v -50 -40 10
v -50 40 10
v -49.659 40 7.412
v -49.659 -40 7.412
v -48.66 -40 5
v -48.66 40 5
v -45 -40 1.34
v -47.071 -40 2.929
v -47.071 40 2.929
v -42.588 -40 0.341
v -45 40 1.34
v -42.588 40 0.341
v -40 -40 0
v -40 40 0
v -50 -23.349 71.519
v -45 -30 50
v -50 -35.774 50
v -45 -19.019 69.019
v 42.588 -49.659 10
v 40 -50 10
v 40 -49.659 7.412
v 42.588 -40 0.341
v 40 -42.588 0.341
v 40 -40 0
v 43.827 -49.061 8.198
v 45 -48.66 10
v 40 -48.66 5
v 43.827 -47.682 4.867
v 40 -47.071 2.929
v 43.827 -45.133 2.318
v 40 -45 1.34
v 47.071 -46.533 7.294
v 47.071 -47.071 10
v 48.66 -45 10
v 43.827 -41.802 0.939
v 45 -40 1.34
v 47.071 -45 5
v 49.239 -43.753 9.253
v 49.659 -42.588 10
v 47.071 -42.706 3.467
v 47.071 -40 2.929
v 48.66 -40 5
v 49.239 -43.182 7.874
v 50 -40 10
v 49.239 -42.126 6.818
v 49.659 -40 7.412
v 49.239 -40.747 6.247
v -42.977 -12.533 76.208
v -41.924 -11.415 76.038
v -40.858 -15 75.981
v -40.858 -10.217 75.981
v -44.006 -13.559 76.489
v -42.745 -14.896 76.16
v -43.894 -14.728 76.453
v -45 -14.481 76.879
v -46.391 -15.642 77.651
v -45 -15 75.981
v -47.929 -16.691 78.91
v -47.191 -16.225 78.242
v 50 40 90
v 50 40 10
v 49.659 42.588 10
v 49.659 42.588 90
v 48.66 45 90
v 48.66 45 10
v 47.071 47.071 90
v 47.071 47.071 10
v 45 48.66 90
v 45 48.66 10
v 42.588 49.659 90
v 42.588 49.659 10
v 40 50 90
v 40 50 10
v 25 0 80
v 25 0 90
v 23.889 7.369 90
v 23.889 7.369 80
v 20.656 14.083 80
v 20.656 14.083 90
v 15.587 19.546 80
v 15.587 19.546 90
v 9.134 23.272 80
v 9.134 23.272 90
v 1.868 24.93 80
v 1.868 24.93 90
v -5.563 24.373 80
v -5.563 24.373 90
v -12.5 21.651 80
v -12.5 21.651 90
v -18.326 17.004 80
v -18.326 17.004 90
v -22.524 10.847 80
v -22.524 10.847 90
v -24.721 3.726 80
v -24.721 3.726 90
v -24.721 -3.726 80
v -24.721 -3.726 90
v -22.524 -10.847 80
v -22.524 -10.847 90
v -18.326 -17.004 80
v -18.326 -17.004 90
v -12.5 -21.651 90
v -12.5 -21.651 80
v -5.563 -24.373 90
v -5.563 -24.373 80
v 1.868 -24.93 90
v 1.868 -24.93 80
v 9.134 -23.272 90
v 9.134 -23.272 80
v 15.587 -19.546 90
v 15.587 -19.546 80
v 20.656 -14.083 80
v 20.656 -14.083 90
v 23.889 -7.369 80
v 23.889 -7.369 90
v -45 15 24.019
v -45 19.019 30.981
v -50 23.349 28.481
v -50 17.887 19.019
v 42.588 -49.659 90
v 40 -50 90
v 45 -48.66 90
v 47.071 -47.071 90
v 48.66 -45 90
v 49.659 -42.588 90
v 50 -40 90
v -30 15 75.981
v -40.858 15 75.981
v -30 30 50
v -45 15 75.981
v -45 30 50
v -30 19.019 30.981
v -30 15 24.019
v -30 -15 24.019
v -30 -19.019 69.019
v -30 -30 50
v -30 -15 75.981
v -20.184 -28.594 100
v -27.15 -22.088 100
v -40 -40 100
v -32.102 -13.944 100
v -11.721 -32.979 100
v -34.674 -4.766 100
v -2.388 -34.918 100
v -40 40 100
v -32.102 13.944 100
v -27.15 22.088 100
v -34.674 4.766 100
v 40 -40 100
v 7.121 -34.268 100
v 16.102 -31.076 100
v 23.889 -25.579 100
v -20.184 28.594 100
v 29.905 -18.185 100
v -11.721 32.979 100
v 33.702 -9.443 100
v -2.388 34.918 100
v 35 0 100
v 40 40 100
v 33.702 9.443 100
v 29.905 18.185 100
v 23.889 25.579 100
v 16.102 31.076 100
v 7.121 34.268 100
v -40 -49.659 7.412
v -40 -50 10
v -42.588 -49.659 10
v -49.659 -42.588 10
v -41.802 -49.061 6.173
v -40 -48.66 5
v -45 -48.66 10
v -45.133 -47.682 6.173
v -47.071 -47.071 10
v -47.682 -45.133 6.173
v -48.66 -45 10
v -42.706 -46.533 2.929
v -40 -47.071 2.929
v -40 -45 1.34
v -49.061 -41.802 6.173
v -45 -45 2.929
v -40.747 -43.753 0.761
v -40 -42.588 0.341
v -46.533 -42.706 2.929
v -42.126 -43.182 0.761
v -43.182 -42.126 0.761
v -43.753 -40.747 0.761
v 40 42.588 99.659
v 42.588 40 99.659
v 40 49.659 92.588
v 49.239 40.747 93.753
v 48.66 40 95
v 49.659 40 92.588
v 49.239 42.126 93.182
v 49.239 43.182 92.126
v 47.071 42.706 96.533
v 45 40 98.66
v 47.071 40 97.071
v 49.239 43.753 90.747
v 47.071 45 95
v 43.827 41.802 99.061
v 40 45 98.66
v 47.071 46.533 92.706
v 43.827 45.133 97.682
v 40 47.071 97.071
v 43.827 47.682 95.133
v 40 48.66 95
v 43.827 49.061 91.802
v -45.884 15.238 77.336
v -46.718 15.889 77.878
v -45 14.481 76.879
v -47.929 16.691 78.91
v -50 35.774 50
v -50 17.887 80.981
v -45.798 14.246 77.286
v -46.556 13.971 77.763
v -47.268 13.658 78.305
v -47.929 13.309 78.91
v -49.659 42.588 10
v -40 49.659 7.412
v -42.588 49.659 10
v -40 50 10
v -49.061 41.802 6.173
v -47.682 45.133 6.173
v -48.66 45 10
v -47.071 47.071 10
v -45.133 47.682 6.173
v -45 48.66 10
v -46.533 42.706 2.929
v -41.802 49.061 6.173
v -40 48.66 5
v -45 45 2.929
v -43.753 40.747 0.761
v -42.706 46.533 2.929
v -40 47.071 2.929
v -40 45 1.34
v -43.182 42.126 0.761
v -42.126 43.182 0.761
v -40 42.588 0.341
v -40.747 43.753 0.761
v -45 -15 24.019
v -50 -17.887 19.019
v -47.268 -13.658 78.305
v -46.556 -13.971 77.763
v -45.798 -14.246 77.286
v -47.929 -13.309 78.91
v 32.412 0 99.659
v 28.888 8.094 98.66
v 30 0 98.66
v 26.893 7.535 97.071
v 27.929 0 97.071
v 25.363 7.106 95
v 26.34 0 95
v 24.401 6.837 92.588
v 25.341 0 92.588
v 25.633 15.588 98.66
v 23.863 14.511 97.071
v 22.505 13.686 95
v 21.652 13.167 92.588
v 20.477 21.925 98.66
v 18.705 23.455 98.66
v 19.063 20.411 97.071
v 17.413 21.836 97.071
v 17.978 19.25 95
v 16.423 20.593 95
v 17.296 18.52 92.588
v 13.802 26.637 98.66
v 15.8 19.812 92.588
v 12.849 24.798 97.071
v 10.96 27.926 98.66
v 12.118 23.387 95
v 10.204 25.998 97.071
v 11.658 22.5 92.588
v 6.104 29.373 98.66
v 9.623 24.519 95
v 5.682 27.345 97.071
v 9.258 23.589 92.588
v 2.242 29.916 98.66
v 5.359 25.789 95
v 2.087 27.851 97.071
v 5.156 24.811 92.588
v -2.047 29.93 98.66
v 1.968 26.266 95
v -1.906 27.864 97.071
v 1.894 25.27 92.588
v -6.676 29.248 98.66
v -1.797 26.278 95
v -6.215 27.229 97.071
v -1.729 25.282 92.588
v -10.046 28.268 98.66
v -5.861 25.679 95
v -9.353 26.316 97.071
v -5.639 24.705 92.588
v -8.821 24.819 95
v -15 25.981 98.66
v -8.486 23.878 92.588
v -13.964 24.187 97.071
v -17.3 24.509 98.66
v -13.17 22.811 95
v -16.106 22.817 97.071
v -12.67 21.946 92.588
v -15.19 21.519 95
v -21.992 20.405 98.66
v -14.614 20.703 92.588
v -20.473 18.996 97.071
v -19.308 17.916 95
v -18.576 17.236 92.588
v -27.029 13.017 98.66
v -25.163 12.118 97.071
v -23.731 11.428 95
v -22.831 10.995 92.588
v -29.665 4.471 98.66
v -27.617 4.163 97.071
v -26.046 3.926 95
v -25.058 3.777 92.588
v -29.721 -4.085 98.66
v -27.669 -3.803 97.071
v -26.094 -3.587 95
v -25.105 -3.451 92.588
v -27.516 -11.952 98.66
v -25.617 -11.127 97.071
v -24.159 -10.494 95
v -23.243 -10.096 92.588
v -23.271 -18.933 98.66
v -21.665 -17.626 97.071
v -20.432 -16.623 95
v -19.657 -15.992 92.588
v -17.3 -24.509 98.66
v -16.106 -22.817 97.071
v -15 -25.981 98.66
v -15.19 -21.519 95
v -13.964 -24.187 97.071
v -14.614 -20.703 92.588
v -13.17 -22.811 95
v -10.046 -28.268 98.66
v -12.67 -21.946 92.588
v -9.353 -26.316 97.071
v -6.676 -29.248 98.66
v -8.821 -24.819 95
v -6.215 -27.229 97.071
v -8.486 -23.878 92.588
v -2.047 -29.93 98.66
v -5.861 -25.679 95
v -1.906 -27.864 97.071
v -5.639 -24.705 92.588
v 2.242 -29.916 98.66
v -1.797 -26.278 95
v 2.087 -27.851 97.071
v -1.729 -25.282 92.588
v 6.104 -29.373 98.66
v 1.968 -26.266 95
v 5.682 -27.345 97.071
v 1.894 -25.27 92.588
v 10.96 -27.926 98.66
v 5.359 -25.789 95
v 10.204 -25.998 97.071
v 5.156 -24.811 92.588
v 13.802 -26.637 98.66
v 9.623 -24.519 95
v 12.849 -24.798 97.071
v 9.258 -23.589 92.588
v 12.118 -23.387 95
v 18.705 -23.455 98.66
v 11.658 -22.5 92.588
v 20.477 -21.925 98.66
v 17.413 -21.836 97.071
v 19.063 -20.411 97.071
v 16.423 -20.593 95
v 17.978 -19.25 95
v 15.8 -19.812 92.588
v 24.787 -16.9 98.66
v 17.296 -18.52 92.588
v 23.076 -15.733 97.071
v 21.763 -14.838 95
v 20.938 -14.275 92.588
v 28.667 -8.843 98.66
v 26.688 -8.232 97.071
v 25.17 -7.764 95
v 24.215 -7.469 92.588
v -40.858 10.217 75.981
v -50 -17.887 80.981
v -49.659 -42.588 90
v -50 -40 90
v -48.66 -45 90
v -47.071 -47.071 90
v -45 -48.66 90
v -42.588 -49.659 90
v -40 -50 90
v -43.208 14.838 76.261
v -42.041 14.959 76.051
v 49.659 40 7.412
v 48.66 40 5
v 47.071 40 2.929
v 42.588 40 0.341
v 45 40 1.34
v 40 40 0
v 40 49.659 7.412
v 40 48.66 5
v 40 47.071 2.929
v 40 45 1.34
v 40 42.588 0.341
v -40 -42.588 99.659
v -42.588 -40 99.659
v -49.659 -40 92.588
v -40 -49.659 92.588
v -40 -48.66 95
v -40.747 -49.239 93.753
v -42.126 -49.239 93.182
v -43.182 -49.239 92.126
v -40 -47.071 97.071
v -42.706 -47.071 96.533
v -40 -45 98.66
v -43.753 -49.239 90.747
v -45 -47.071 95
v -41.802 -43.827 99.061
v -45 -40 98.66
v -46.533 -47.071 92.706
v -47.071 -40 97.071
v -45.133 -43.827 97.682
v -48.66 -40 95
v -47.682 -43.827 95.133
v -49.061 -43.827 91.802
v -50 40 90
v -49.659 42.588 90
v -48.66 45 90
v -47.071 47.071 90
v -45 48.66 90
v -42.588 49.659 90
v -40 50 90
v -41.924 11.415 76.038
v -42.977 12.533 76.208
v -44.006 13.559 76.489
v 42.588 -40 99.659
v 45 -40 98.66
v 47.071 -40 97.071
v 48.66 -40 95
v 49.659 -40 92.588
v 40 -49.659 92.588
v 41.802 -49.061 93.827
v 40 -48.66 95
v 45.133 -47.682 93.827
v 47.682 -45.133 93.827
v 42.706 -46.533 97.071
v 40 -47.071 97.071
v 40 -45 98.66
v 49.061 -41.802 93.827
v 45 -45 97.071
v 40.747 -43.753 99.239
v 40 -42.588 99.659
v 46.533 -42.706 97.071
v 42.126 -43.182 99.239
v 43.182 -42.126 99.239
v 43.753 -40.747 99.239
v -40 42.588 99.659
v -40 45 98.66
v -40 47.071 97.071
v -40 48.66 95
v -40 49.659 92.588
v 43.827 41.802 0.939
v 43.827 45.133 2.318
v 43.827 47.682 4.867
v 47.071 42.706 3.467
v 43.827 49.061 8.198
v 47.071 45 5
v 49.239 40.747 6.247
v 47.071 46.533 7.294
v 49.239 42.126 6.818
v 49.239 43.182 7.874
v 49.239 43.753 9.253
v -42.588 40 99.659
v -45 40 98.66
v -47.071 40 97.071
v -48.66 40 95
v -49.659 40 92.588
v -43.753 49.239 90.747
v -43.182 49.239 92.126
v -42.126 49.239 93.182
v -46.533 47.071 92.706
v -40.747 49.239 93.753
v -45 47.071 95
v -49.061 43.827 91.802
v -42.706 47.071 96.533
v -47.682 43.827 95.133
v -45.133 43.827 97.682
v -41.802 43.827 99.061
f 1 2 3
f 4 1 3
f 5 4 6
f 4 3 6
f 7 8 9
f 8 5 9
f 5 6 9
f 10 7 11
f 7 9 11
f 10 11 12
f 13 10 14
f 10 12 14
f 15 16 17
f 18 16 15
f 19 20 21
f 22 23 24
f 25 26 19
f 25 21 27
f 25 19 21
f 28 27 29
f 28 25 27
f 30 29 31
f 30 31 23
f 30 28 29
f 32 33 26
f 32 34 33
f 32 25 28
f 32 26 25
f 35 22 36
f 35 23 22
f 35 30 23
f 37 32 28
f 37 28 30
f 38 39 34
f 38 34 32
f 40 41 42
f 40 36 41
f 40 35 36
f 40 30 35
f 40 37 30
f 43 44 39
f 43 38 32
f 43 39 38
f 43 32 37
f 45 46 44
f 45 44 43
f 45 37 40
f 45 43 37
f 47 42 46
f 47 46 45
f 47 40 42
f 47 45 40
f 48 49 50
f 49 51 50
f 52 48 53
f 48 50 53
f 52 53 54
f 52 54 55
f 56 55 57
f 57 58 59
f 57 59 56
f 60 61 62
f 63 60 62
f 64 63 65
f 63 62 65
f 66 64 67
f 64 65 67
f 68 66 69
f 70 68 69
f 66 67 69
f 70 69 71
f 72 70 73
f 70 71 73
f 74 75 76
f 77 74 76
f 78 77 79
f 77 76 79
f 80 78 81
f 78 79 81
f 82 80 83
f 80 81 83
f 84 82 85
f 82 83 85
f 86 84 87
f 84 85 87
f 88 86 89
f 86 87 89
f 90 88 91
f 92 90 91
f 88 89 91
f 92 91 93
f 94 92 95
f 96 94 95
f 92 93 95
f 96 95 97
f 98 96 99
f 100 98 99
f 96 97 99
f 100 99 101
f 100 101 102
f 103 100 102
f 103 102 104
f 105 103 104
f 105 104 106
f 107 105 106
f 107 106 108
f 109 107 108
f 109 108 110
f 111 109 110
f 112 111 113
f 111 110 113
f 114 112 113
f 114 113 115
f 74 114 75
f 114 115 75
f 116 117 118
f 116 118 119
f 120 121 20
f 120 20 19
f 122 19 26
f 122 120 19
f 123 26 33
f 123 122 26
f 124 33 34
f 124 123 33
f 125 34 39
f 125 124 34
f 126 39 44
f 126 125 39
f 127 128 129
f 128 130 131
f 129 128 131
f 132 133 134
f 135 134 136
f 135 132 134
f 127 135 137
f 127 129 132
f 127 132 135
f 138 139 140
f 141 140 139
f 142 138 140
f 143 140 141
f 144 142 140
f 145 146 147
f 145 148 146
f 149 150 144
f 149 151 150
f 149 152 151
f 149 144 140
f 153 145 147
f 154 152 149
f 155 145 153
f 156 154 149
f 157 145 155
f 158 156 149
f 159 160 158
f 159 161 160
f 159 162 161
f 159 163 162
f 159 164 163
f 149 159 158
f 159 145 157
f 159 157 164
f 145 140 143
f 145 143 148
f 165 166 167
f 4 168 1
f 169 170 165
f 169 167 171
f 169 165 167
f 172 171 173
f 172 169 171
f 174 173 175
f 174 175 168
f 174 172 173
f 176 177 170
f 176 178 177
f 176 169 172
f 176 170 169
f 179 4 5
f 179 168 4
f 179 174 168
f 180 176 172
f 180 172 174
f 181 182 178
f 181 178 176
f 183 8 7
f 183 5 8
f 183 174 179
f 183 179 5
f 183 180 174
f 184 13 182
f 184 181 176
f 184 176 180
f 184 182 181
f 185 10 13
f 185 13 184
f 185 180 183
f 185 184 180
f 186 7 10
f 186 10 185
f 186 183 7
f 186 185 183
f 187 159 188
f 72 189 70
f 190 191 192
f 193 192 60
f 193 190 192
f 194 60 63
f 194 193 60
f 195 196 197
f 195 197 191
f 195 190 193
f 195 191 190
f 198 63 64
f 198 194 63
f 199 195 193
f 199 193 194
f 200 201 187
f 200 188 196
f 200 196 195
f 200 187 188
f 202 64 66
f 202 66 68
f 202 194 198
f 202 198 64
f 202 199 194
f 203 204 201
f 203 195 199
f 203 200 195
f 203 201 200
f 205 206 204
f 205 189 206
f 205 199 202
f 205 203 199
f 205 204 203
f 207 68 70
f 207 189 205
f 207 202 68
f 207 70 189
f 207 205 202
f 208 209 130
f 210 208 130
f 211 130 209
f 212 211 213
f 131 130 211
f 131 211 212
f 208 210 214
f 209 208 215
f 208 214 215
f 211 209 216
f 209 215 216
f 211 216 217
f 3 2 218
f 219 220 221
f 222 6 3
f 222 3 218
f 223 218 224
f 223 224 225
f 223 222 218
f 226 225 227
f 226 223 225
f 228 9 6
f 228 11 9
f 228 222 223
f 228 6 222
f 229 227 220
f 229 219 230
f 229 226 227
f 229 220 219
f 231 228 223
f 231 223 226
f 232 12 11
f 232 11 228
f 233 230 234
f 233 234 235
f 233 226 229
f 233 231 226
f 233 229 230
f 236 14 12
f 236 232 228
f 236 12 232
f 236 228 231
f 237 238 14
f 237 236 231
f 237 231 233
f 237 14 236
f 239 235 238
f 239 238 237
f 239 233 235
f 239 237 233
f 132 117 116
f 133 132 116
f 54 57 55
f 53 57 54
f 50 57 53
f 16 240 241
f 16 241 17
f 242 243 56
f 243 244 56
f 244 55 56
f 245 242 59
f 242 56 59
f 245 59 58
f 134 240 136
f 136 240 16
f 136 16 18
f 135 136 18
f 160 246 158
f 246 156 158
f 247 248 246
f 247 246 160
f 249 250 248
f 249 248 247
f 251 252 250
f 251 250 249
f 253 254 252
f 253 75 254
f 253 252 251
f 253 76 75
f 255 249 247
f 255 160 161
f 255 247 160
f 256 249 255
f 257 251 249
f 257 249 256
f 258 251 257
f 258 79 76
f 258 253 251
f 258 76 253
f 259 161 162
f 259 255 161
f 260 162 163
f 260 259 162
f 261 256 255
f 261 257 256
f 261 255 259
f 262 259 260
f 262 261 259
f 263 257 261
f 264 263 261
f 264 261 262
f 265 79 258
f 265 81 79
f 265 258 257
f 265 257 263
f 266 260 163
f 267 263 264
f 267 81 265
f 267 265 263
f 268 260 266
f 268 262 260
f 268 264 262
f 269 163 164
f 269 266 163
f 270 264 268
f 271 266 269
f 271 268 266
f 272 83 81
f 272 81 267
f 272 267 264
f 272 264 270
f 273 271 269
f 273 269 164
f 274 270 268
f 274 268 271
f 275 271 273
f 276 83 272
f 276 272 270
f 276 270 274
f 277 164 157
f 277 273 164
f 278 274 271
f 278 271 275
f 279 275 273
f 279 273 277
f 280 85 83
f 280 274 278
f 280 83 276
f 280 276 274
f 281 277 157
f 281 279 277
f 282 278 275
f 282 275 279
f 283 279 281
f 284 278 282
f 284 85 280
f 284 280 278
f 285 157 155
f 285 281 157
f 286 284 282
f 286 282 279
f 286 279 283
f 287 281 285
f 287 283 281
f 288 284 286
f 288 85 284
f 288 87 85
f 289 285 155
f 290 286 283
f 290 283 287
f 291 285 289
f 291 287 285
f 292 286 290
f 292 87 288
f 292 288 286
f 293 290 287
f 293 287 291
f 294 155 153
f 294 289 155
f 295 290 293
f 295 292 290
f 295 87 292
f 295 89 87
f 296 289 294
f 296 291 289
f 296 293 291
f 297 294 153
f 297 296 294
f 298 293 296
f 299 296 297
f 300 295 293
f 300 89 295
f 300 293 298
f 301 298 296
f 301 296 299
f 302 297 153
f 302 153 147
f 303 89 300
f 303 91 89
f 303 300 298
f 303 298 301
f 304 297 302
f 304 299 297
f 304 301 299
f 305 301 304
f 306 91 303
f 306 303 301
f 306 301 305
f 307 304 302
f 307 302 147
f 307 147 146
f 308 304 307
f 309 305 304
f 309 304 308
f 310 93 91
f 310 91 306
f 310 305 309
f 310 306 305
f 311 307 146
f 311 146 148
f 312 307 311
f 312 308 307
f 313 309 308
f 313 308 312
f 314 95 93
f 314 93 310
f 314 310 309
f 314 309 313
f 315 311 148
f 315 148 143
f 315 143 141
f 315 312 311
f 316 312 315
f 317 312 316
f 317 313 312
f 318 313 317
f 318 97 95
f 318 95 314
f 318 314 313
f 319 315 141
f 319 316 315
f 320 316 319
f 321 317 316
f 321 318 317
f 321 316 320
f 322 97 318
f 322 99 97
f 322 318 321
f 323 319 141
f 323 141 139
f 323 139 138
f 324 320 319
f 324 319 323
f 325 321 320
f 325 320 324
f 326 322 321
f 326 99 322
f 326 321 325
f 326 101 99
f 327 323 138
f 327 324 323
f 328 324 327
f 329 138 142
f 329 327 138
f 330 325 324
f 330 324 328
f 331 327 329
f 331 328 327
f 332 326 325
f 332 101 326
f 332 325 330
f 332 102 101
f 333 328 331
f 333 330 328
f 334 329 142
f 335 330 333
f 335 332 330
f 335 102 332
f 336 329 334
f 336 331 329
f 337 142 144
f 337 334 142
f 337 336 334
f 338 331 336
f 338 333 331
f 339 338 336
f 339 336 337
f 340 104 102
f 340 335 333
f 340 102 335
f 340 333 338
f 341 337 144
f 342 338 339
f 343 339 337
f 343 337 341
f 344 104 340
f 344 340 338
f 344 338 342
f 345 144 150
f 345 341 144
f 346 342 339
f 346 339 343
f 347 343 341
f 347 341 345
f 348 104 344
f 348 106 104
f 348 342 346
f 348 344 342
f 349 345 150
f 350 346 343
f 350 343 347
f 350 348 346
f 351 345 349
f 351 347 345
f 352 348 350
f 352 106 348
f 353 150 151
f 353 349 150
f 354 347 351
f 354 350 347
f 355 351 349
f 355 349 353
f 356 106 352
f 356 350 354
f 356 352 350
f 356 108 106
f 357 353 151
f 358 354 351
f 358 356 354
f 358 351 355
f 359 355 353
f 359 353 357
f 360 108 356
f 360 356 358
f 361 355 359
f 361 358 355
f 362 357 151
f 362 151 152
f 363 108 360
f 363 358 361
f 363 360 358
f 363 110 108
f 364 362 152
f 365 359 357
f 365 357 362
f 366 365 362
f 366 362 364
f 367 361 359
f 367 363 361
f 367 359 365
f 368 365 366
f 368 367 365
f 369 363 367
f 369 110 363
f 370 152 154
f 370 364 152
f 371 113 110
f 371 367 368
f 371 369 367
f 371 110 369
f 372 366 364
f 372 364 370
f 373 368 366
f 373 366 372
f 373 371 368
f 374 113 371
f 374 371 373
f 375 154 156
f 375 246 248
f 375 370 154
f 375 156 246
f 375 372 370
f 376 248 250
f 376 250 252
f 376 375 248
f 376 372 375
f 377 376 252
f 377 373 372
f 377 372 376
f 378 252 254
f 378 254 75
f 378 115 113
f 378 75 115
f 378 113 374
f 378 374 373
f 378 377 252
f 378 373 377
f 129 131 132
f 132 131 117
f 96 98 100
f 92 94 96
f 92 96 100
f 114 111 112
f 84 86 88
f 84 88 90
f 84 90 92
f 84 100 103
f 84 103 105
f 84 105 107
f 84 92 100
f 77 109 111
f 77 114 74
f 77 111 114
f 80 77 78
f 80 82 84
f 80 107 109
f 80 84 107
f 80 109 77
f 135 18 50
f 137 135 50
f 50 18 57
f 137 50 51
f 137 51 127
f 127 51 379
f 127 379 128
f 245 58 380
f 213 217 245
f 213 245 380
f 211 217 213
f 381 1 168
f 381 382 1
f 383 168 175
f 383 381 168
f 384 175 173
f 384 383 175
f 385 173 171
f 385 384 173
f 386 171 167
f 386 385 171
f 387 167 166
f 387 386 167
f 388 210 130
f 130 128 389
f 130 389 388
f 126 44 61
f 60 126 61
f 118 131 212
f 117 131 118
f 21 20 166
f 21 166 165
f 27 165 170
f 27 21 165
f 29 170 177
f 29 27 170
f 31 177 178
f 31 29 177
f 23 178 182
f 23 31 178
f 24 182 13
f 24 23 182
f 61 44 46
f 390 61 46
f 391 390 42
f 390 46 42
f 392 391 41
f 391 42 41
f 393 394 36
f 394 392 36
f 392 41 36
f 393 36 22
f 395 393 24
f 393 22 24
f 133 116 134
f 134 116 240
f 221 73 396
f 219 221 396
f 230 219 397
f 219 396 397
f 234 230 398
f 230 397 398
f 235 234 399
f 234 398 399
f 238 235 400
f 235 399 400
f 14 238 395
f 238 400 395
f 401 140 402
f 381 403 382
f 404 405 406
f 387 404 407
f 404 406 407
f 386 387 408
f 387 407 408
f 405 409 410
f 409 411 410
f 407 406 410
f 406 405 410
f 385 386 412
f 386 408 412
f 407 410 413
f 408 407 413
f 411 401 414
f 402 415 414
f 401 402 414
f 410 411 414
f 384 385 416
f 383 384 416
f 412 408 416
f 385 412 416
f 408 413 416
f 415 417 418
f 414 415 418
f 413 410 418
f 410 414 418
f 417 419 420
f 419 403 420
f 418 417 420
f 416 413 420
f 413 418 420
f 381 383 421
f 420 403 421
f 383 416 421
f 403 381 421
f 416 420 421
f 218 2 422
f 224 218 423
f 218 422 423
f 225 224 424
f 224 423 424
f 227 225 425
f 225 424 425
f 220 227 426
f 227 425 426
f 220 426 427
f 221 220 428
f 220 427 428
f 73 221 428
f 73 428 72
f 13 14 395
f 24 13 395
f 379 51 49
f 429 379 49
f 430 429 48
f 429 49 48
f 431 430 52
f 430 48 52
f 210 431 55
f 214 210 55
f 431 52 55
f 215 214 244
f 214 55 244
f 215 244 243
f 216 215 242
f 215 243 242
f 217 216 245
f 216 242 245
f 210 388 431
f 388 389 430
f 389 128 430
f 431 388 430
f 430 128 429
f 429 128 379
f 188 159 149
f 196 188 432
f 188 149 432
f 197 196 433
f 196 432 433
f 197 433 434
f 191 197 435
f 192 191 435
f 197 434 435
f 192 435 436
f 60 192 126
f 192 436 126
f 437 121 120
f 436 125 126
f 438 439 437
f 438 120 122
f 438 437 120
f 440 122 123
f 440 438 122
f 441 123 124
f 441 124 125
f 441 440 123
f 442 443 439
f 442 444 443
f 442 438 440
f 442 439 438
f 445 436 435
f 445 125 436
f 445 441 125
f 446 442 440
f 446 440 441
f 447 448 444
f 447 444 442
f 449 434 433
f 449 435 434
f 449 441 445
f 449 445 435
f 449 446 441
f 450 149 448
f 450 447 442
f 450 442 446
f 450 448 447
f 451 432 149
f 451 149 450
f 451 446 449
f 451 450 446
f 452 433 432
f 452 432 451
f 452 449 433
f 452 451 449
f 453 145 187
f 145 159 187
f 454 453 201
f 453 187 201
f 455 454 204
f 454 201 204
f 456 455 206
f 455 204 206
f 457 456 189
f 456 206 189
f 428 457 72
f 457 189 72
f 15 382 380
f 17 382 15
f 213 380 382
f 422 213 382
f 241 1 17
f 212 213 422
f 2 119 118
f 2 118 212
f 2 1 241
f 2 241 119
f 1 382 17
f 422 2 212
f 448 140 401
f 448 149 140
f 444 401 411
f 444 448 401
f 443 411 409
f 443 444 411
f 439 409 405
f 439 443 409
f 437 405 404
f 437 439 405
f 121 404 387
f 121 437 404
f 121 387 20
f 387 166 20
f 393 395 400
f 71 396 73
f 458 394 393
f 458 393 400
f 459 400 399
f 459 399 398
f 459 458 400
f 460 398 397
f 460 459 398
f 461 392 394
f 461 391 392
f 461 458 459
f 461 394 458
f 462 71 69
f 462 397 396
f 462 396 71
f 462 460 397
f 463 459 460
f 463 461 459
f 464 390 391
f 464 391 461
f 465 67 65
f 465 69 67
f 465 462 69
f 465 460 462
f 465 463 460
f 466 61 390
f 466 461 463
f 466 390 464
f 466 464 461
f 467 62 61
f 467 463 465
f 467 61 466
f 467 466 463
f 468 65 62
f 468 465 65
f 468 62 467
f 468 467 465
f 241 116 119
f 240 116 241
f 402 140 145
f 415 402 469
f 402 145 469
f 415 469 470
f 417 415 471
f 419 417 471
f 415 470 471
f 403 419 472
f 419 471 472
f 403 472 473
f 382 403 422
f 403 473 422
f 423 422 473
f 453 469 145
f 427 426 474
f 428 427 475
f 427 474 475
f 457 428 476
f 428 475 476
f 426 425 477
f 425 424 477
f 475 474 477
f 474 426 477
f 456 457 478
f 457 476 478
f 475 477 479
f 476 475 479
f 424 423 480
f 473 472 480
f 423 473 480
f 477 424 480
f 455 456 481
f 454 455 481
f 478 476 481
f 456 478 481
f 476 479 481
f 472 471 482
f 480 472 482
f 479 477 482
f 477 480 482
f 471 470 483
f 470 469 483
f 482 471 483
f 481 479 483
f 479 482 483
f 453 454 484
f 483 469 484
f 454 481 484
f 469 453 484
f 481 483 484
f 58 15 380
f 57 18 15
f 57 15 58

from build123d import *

# Parameters (mm, degrees)
SKETCH1_W           = 100
SKETCH1_H           = 100
BOSS_EXTRUDE1_DEPTH = 100
SKETCH2_R           = 25
CUT_EXTRUDE1_DEPTH  = 20
CUT_EXTRUDE3_DEPTH  = 20
CHAMFER1_SIZE       = 5
FILLET1_R           = 10
FILLET2_R           = 10
FILLET3_R           = 10


with BuildPart() as part:
    # Sketch1 → Boss-Extrude1 (new body)
    with BuildSketch(Plane.XY):
        Rectangle(SKETCH1_W, SKETCH1_H)
    extrude(amount=BOSS_EXTRUDE1_DEPTH)

    # Sketch2 → Cut-Extrude1 (cut)
    with BuildSketch(Plane.XY.offset(100)):
        Circle(SKETCH2_R)
    extrude(amount=-CUT_EXTRUDE1_DEPTH, mode=Mode.SUBTRACT)

    # Sketch6 → Cut-Extrude3 (cut)
    with BuildSketch(Plane.ZY.offset(50)):
        Polygon((69.019237886, -19.019237886), (30.980762114, 19.019237886), (24.019237886, 15), (24.019237886, -15), (50, -30), align=None)
        Polygon((50, 30), (30.980762114, 19.019237886), (69.019237886, -19.019237886), (75.980762114, -15), (75.980762114, 15), align=None)
    extrude(amount=-CUT_EXTRUDE3_DEPTH, mode=Mode.SUBTRACT)

    # Chamfer1
    chamfer1_edges = [part.edges().sort_by_distance(p)[0] for p in [
        (-50, -22.5, 37.009618943),
        (-50, -22.5, 62.990381057),
        (-50, 0, 75.980762114),
        (-50, 22.5, 62.990381057),
        (-50, 22.5, 37.009618943),
        (-50, 0, 24.019237886),
    ]]
    chamfer(chamfer1_edges, length=CHAMFER1_SIZE)

    # Fillet1
    fillet1_edges = [part.edges().sort_by_distance(p)[0] for p in [
        (-25, 0, 100),
    ]]
    fillet(fillet1_edges, radius=FILLET1_R)

    # Fillet2
    fillet2_edges = [part.edges().sort_by_distance(p)[0] for p in [
        (-50, 0, 100),
        (0, -50, 100),
        (0, -50, 0),
        (50, -50, 50),
        (-50, -50, 50),
        (-50, 50, 50),
        (0, 50, 100),
    ]]
    fillet(fillet2_edges, radius=FILLET2_R)

    # Fillet3
    # the kernel refuses this fillet: 10 mm, written as the material it takes off along each edge
    with BuildSketch(Plane(origin=(40, -40, 10), x_dir=(0, 0, -1), z_dir=(1, 0, 0))) as fillet3_piece_1_section:
        Polygon((0, 0), (FILLET3_R, 0), (FILLET3_R, -FILLET3_R), (0, -FILLET3_R), align=None)
    fillet3_piece_1 = extrude(amount=FILLET3_R, mode=Mode.PRIVATE)
    fillet3_piece_1 = fillet3_piece_1 - Plane(origin=(40, -40, 10), x_dir=(0, 0.7071067811865475, 0.7071067811865475), z_dir=(1, 0, 0)) * Sphere(FILLET3_R, mode=Mode.PRIVATE)
    add(fillet3_piece_1, mode=Mode.SUBTRACT)
    with BuildSketch(Plane(origin=(40, -40, 90), x_dir=(1, 0, 0), z_dir=(0, 0, 1))) as fillet3_piece_2_section:
        Polygon((0, 0), (FILLET3_R, 0), (FILLET3_R, -FILLET3_R), (0, -FILLET3_R), align=None)
    fillet3_piece_2 = extrude(amount=FILLET3_R, mode=Mode.PRIVATE)
    fillet3_piece_2 = fillet3_piece_2 - Plane(origin=(40, -40, 90), x_dir=(-0.7071067811865475, 0.7071067811865475, 0), z_dir=(0, 0, 1)) * Sphere(FILLET3_R, mode=Mode.PRIVATE)
    add(fillet3_piece_2, mode=Mode.SUBTRACT)
    with BuildSketch(Plane(origin=(-40, -40, 10), x_dir=(-1, 0, 0), z_dir=(0, 0, -1))) as fillet3_piece_3_section:
        Polygon((0, 0), (FILLET3_R, 0), (FILLET3_R, -FILLET3_R), (0, -FILLET3_R), align=None)
    fillet3_piece_3 = extrude(amount=FILLET3_R, mode=Mode.PRIVATE)
    fillet3_piece_3 = fillet3_piece_3 - Plane(origin=(-40, -40, 10), x_dir=(0.7071067811865475, 0.7071067811865475, 0), z_dir=(0, 0, -1)) * Sphere(FILLET3_R, mode=Mode.PRIVATE)
    add(fillet3_piece_3, mode=Mode.SUBTRACT)
    with BuildSketch(Plane(origin=(40, 40, 10), x_dir=(0, 1, 0), z_dir=(1, 0, 0))) as fillet3_piece_4_section:
        Polygon((0, 0), (FILLET3_R, 0), (FILLET3_R, -FILLET3_R), (0, -FILLET3_R), align=None)
    fillet3_piece_4 = extrude(amount=FILLET3_R, mode=Mode.PRIVATE)
    fillet3_piece_4 = fillet3_piece_4 - Plane(origin=(40, 40, 10), x_dir=(0, -0.7071067811865475, 0.7071067811865475), z_dir=(1, 0, 0)) * Sphere(FILLET3_R, mode=Mode.PRIVATE)
    add(fillet3_piece_4, mode=Mode.SUBTRACT)
    with BuildSketch(Plane(origin=(-45, -25.355339059, 75.980762114), x_dir=(-0.7071067811865476, 0, 0.7071067811865476), z_dir=(0, 1, 0))) as fillet3_piece_5_section:
        with BuildLine():
            CenterArc((FILLET3_R * 0.414213562373, FILLET3_R), FILLET3_R, 225, 45)
            Line((-FILLET3_R * 0.292893218813, FILLET3_R * 0.292893218813), (0, 0))
            Line((0, 0), (FILLET3_R * 0.414213562373, 0))
        make_face()
    fillet3_piece_5 = extrude(amount=50.710678119, mode=Mode.PRIVATE)
    fillet3_piece_5 = split(fillet3_piece_5, bisect_by=Plane(origin=(-43.280595019, -13.170460791, 75.710807016), z_dir=(0.7071067811865477, -0.6123724356957944, 0.35355339059327423)), keep=Keep.TOP, mode=Mode.PRIVATE)
    fillet3_piece_5 = split(fillet3_piece_5, bisect_by=Plane(origin=(-42.707460026, -14.659509184, 76.570509507), z_dir=(0, 0.8660254037844383, -0.5000000000000008)), keep=Keep.TOP, mode=Mode.PRIVATE)
    add(fillet3_piece_5, mode=Mode.SUBTRACT)
    with BuildSketch(Plane(origin=(-45, -25.355339059, 75.980762114), x_dir=(-0.7071067811865476, 0, 0.7071067811865476), z_dir=(0, 1, 0))) as fillet3_piece_6_section:
        with BuildLine():
            CenterArc((FILLET3_R * 0.414213562373, FILLET3_R), FILLET3_R, 225, 45)
            Line((-FILLET3_R * 0.292893218813, FILLET3_R * 0.292893218813), (0, 0))
            Line((0, 0), (FILLET3_R * 0.414213562373, 0))
        make_face()
    fillet3_piece_6 = extrude(amount=50.710678119, mode=Mode.PRIVATE)
    fillet3_piece_6 = split(fillet3_piece_6, bisect_by=Plane(origin=(-46.28634247, -15.385729384, 77.885344161), z_dir=(-0.7071067811865477, 0.6123724356957944, -0.35355339059327423)), keep=Keep.TOP, mode=Mode.PRIVATE)
    fillet3_piece_6 = split(fillet3_piece_6, bisect_by=Plane(origin=(-46.715123293, -14.271724128, 77.242172926), z_dir=(0, -0.8660254037844383, 0.5000000000000008)), keep=Keep.TOP, mode=Mode.PRIVATE)
    add(fillet3_piece_6, mode=Mode.SUBTRACT)
    with BuildSketch(Plane(origin=(-45, -25.355339059, 75.980762114), x_dir=(-0.7071067811865476, 0, 0.7071067811865476), z_dir=(0, 1, 0))) as fillet3_piece_7_section:
        with BuildLine():
            CenterArc((FILLET3_R * 0.414213562373, FILLET3_R), FILLET3_R, 225, 45)
            Line((-FILLET3_R * 0.292893218813, FILLET3_R * 0.292893218813), (0, 0))
            Line((0, 0), (FILLET3_R * 0.414213562373, 0))
        make_face()
    fillet3_piece_7 = extrude(amount=50.710678119, mode=Mode.PRIVATE)
    fillet3_piece_7 = split(fillet3_piece_7, bisect_by=Plane(origin=(-38.58008118, -5.415701855, 79.741415816), z_dir=(-0.7071067811865477, 0.6123724356957944, -0.35355339059327423)), keep=Keep.TOP, mode=Mode.PRIVATE)
    fillet3_piece_7 = split(fillet3_piece_7, bisect_by=Plane(origin=(-38.58008118, 5.415701855, 79.741415816), z_dir=(-0.7071067811865476, -0.6123724356957948, -0.3535533905932732)), keep=Keep.TOP, mode=Mode.PRIVATE)
    fillet3_piece_7 = split(fillet3_piece_7, bisect_by=Plane(origin=(-44.833595027, -10.975514643, 82.951375226), z_dir=(0, 0.8660254037844383, -0.5000000000000008)), keep=Keep.TOP, mode=Mode.PRIVATE)
    fillet3_piece_7 = split(fillet3_piece_7, bisect_by=Plane(origin=(-44.833595027, 10.975514643, 82.951375226), z_dir=(0, -0.8660254037844392, -0.49999999999999917)), keep=Keep.TOP, mode=Mode.PRIVATE)
    add(fillet3_piece_7, mode=Mode.SUBTRACT)
    with BuildSketch(Plane(origin=(-45, -25.355339059, 75.980762114), x_dir=(-0.7071067811865476, 0, 0.7071067811865476), z_dir=(0, 1, 0))) as fillet3_piece_8_section:
        with BuildLine():
            CenterArc((FILLET3_R * 0.414213562373, FILLET3_R), FILLET3_R, 225, 45)
            Line((-FILLET3_R * 0.292893218813, FILLET3_R * 0.292893218813), (0, 0))
            Line((0, 0), (FILLET3_R * 0.414213562373, 0))
        make_face()
    fillet3_piece_8 = extrude(amount=50.710678119, mode=Mode.PRIVATE)
    fillet3_piece_8 = split(fillet3_piece_8, bisect_by=Plane(origin=(-43.280595019, 13.170460791, 75.710807016), z_dir=(0.7071067811865476, 0.6123724356957948, 0.3535533905932732)), keep=Keep.TOP, mode=Mode.PRIVATE)
    fillet3_piece_8 = split(fillet3_piece_8, bisect_by=Plane(origin=(-42.707460026, 14.659509184, 76.570509507), z_dir=(0, -0.8660254037844392, -0.49999999999999917)), keep=Keep.TOP, mode=Mode.PRIVATE)
    add(fillet3_piece_8, mode=Mode.SUBTRACT)
    with BuildSketch(Plane(origin=(-45, -25.355339059, 75.980762114), x_dir=(-0.7071067811865476, 0, 0.7071067811865476), z_dir=(0, 1, 0))) as fillet3_piece_9_section:
        with BuildLine():
            CenterArc((FILLET3_R * 0.414213562373, FILLET3_R), FILLET3_R, 225, 45)
            Line((-FILLET3_R * 0.292893218813, FILLET3_R * 0.292893218813), (0, 0))
            Line((0, 0), (FILLET3_R * 0.414213562373, 0))
        make_face()
    fillet3_piece_9 = extrude(amount=50.710678119, mode=Mode.PRIVATE)
    fillet3_piece_9 = split(fillet3_piece_9, bisect_by=Plane(origin=(-46.28634247, 15.385729384, 77.885344161), z_dir=(-0.7071067811865476, -0.6123724356957948, -0.3535533905932732)), keep=Keep.TOP, mode=Mode.PRIVATE)
    fillet3_piece_9 = split(fillet3_piece_9, bisect_by=Plane(origin=(-46.715123293, 14.271724128, 77.242172926), z_dir=(0, 0.8660254037844392, 0.49999999999999917)), keep=Keep.TOP, mode=Mode.PRIVATE)
    add(fillet3_piece_9, mode=Mode.SUBTRACT)
    with BuildSketch(Plane(origin=(40, 50, 0), x_dir=(0, 0, 1), z_dir=(-1, 0, 0)), Plane(origin=(50, -40, 0), x_dir=(0, 0, 1), z_dir=(0, 1, 0)), Plane(origin=(50, 50, 10), x_dir=(0, -1, 0), z_dir=(0, 0, 1)), Plane(origin=(50, -40, 100), x_dir=(-1, 0, 0), z_dir=(0, 1, 0))) as fillet3_piece_10:
        with BuildLine():
            CenterArc((FILLET3_R, -FILLET3_R), FILLET3_R, 90, 90)
            Line((0, -FILLET3_R), (0, 0))
            Line((0, 0), (FILLET3_R, 0))
        make_face()
    extrude(amount=80, mode=Mode.SUBTRACT)
    with BuildSketch(Plane(origin=(-50, 40, 0), x_dir=(1, 0, 0), z_dir=(0, -1, 0))) as fillet3_piece_11:
        with BuildLine():
            CenterArc((FILLET3_R, FILLET3_R), FILLET3_R, 180, 90)
            Line((0, FILLET3_R), (0, 0))
            Line((0, 0), (FILLET3_R, 0))
        make_face()
    extrude(amount=80, mode=Mode.SUBTRACT)
    with BuildSketch(Plane(origin=(-40, 40, 0), x_dir=(-1, 0, 0), z_dir=(0, -1, 0))) as fillet3_piece_12:
        with BuildLine():
            CenterArc((10 - FILLET3_R, -FILLET3_R), FILLET3_R, 0, 90)
            Line((10, -FILLET3_R), (10, 0))
            Line((10, 0), (10 - FILLET3_R, 0))
        make_face()
    revolve(axis=Axis((-40, 40, 0), (0, 0, -1)), revolution_arc=90, mode=Mode.SUBTRACT)
    with BuildSketch(Plane(origin=(50, 40, 90), x_dir=(0, 0, 1), z_dir=(0, -1, 0))) as fillet3_piece_13:
        with BuildLine():
            CenterArc((10 - FILLET3_R, FILLET3_R), FILLET3_R, 270, 90)
            Line((10, FILLET3_R), (10, 0))
            Line((10, 0), (10 - FILLET3_R, 0))
        make_face()
    revolve(axis=Axis((50, 40, 90), (-1, 0, 0)), revolution_arc=90, mode=Mode.SUBTRACT)


solid = part.part
